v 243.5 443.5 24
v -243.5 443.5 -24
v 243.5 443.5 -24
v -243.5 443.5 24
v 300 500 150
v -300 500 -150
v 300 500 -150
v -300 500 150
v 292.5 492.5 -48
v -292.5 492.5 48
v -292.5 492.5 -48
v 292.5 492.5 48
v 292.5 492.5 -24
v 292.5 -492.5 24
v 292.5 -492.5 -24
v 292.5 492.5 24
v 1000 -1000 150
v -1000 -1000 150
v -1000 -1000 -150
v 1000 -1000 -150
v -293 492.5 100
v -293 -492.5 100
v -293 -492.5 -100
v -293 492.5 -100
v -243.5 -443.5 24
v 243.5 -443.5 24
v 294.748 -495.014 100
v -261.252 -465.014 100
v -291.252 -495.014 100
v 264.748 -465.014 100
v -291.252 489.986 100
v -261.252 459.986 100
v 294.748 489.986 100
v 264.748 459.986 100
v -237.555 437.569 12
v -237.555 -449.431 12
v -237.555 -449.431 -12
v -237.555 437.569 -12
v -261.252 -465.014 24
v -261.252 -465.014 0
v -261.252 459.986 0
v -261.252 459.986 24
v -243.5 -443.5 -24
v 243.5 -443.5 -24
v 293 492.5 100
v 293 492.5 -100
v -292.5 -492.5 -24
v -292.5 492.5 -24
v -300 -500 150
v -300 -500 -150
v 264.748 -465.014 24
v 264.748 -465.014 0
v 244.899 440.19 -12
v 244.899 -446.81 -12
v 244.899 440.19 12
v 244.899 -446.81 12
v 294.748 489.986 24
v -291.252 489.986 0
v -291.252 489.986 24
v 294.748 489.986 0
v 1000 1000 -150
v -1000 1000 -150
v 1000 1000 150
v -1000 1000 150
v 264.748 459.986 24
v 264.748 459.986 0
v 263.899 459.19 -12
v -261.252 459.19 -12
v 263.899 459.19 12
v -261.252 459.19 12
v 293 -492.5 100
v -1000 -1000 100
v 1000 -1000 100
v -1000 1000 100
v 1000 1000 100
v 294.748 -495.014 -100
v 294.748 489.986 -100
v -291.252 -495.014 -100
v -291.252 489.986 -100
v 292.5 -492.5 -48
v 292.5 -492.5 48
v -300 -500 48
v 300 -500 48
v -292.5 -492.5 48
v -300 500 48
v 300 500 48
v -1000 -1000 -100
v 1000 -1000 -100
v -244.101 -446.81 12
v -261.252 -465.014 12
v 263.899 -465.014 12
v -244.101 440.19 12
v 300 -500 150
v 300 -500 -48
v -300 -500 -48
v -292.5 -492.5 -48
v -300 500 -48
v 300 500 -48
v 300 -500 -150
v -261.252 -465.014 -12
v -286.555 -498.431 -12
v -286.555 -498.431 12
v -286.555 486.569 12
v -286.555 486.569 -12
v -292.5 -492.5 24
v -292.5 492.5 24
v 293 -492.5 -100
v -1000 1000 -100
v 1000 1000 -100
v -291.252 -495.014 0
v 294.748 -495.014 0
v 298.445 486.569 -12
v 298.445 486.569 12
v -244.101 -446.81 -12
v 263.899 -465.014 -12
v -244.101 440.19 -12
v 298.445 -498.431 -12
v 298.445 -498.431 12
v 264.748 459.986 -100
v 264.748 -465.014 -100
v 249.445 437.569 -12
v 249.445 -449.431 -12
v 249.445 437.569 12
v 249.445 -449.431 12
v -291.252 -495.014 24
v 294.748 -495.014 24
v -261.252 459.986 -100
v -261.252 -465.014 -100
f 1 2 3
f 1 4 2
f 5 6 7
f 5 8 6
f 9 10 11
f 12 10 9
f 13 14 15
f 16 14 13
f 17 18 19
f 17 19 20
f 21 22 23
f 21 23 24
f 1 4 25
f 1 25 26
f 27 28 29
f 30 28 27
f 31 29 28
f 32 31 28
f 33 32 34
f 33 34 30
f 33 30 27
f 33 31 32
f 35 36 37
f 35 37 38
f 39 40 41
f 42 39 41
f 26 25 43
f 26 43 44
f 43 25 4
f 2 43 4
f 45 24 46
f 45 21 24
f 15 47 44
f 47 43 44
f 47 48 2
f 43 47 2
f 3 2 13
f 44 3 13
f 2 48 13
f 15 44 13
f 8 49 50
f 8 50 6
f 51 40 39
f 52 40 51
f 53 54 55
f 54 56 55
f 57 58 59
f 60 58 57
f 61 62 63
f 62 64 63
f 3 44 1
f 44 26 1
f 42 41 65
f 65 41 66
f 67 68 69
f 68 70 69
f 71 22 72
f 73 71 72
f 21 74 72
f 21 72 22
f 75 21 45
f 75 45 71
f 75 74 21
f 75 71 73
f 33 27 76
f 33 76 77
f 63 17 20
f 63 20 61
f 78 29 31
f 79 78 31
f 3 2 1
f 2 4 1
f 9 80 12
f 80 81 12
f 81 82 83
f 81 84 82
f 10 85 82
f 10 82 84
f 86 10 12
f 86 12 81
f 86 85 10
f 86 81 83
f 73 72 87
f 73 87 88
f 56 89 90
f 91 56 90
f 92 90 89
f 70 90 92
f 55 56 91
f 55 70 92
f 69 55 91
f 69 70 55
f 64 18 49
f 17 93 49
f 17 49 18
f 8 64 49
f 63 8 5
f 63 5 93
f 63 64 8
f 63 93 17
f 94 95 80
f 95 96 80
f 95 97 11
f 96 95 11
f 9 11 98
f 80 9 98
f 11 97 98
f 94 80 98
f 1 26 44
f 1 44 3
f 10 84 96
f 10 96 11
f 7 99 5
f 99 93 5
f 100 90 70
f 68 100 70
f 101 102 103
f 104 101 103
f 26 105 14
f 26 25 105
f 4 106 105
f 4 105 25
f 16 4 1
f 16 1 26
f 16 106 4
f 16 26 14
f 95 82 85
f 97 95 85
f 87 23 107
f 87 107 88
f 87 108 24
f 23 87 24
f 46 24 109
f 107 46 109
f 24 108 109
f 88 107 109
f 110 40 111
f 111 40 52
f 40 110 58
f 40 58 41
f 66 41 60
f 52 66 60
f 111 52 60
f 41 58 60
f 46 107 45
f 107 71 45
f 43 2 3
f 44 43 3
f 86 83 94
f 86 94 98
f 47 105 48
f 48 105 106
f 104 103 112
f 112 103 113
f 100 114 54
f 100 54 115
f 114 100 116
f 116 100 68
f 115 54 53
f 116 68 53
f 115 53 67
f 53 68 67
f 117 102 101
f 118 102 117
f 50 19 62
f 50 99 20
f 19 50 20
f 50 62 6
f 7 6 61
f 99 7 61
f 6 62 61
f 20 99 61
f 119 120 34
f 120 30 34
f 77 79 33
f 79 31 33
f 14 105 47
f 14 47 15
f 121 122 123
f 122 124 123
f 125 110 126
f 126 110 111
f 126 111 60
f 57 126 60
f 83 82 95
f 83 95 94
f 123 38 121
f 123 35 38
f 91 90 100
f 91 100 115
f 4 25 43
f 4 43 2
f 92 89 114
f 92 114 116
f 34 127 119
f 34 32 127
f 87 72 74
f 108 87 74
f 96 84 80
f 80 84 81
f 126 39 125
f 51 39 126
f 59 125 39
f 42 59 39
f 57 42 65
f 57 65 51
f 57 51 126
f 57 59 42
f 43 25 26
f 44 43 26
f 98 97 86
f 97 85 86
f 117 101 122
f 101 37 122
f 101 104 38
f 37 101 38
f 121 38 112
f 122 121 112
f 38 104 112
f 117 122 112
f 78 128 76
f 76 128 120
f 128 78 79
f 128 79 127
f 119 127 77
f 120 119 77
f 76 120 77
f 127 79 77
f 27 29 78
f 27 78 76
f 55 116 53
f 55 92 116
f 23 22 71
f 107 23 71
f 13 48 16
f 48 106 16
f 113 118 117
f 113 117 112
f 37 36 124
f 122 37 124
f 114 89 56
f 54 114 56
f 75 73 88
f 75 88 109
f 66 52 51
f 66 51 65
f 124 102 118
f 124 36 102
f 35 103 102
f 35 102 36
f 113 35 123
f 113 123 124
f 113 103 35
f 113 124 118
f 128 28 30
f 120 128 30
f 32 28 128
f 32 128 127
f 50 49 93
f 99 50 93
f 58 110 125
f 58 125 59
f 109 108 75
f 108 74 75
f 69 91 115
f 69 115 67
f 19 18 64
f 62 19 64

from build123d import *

# Parameters (mm, degrees)
F0_W      = 600
F0_H      = 1000
F0_W_2    = 585
F0_H_2    = 985
F1_DEPTH  = 48
F2_W      = 584.999994
F2_H      = 985
F2_W_2    = 486.999994
F2_H_2    = 887
F3_DEPTH  = 24
F4_W      = 584.999994
F4_H      = 985
F4_W_2    = 486.999994
F4_H_2    = 887
F5_DEPTH  = 12
F6_W      = 526.000005
F6_H      = 925
F7_DEPTH  = 25
F6_W_2    = 586.000005
F6_H_2    = 985
F9_DEPTH  = 24
F10_W     = 525.151242
F10_H     = 924.204456
F10_W_2   = 489
F10_H_2   = 887
F11_DEPTH = 12
F12_DEPTH = 100
F13_W     = 2000
F13_H     = 2000
F13_W_2   = 586.000006
F13_H_2   = 985
F14_DEPTH = 100
F15_W     = 2000
F15_H     = 2000
F15_W_2   = 600
F15_H_2   = 1000
F16_DEPTH = 150
F17_DEPTH = 24


with BuildPart() as f1:
    # F0 (on Top) → F1 (new body, symmetric)
    with BuildSketch(Plane.XY):
        Rectangle(F0_W, F0_H)
        Rectangle(F0_W_2, F0_H_2, mode=Mode.SUBTRACT)
    extrude(amount=F1_DEPTH, both=True)


with BuildPart() as f3:
    # F2 (on Top) → F3 (new body, symmetric)
    with BuildSketch(Plane.XY):
        with Locations((-3e-06, 0)):
            Rectangle(F2_W, F2_H)
        with Locations((-3e-06, 0)):
            Rectangle(F2_W_2, F2_H_2, mode=Mode.SUBTRACT)
    extrude(amount=F3_DEPTH, both=True)


with BuildPart() as f5:
    # F4 (on Top) → F5 (new body, symmetric)
    with BuildSketch(Plane.XY):
        with Locations((5.945058, -5.931342)):
            Rectangle(F4_W, F4_H)
        with Locations((5.945058, -5.931342)):
            Rectangle(F4_W_2, F4_H_2, mode=Mode.SUBTRACT)
    extrude(amount=F5_DEPTH, both=True)


with BuildPart() as f7:
    # F6 (on Top) → F7 (new body)
    with BuildSketch(Plane.XY):
        with Locations((1.748123, -2.514053)):
            Rectangle(F6_W, F6_H)
    extrude(amount=F7_DEPTH)


with BuildPart() as f9:
    # F6 (on Top) → F9 (new body)
    with BuildSketch(Plane.XY):
        with Locations((1.748122, -2.514053)):
            Rectangle(F6_W_2, F6_H_2)
        with Locations((1.748123, -2.514053)):
            Rectangle(F6_W, F6_H, mode=Mode.SUBTRACT)
    extrude(amount=F9_DEPTH)


with BuildPart() as f11:
    # F10 (on face) → F11 (new body, symmetric)
    with BuildSketch(Plane.XY):
        with Locations((1.323741, -2.911825)):
            Rectangle(F10_W, F10_H)
        with Locations((0.399362, -3.309597)):
            Rectangle(F10_W_2, F10_H_2, mode=Mode.SUBTRACT)
    extrude(amount=F11_DEPTH, both=True)


with BuildPart() as f12:
    # F6 (on Top) → F12 (new body, symmetric)
    with BuildSketch(Plane.XY):
        with Locations((1.748122, -2.514053)):
            Rectangle(F6_W_2, F6_H_2)
        with Locations((1.748123, -2.514053)):
            Rectangle(F6_W, F6_H, mode=Mode.SUBTRACT)
    extrude(amount=F12_DEPTH, both=True)


with BuildPart() as f14:
    # F13 (on Top) → F14 (new body, symmetric)
    with BuildSketch(Plane.XY):
        Rectangle(F13_W, F13_H)
        Rectangle(F13_W_2, F13_H_2, mode=Mode.SUBTRACT)
    extrude(amount=F14_DEPTH, both=True)


with BuildPart() as f16:
    # F15 (on Top) → F16 (new body, symmetric)
    with BuildSketch(Plane.XY):
        Rectangle(F15_W, F15_H)
        Rectangle(F15_W_2, F15_H_2, mode=Mode.SUBTRACT)
    extrude(amount=F16_DEPTH, both=True)


with BuildPart() as f17:
    # F2 (on Top) → F17 (new body, symmetric)
    with BuildSketch(Plane.XY):
        with Locations((-3e-06, 0)):
            Rectangle(F2_W_2, F2_H_2)
    extrude(amount=F17_DEPTH, both=True)


solid = Compound([f1.part, f3.part, f5.part, f9.part, f11.part, f12.part, f14.part, f16.part, f17.part])
